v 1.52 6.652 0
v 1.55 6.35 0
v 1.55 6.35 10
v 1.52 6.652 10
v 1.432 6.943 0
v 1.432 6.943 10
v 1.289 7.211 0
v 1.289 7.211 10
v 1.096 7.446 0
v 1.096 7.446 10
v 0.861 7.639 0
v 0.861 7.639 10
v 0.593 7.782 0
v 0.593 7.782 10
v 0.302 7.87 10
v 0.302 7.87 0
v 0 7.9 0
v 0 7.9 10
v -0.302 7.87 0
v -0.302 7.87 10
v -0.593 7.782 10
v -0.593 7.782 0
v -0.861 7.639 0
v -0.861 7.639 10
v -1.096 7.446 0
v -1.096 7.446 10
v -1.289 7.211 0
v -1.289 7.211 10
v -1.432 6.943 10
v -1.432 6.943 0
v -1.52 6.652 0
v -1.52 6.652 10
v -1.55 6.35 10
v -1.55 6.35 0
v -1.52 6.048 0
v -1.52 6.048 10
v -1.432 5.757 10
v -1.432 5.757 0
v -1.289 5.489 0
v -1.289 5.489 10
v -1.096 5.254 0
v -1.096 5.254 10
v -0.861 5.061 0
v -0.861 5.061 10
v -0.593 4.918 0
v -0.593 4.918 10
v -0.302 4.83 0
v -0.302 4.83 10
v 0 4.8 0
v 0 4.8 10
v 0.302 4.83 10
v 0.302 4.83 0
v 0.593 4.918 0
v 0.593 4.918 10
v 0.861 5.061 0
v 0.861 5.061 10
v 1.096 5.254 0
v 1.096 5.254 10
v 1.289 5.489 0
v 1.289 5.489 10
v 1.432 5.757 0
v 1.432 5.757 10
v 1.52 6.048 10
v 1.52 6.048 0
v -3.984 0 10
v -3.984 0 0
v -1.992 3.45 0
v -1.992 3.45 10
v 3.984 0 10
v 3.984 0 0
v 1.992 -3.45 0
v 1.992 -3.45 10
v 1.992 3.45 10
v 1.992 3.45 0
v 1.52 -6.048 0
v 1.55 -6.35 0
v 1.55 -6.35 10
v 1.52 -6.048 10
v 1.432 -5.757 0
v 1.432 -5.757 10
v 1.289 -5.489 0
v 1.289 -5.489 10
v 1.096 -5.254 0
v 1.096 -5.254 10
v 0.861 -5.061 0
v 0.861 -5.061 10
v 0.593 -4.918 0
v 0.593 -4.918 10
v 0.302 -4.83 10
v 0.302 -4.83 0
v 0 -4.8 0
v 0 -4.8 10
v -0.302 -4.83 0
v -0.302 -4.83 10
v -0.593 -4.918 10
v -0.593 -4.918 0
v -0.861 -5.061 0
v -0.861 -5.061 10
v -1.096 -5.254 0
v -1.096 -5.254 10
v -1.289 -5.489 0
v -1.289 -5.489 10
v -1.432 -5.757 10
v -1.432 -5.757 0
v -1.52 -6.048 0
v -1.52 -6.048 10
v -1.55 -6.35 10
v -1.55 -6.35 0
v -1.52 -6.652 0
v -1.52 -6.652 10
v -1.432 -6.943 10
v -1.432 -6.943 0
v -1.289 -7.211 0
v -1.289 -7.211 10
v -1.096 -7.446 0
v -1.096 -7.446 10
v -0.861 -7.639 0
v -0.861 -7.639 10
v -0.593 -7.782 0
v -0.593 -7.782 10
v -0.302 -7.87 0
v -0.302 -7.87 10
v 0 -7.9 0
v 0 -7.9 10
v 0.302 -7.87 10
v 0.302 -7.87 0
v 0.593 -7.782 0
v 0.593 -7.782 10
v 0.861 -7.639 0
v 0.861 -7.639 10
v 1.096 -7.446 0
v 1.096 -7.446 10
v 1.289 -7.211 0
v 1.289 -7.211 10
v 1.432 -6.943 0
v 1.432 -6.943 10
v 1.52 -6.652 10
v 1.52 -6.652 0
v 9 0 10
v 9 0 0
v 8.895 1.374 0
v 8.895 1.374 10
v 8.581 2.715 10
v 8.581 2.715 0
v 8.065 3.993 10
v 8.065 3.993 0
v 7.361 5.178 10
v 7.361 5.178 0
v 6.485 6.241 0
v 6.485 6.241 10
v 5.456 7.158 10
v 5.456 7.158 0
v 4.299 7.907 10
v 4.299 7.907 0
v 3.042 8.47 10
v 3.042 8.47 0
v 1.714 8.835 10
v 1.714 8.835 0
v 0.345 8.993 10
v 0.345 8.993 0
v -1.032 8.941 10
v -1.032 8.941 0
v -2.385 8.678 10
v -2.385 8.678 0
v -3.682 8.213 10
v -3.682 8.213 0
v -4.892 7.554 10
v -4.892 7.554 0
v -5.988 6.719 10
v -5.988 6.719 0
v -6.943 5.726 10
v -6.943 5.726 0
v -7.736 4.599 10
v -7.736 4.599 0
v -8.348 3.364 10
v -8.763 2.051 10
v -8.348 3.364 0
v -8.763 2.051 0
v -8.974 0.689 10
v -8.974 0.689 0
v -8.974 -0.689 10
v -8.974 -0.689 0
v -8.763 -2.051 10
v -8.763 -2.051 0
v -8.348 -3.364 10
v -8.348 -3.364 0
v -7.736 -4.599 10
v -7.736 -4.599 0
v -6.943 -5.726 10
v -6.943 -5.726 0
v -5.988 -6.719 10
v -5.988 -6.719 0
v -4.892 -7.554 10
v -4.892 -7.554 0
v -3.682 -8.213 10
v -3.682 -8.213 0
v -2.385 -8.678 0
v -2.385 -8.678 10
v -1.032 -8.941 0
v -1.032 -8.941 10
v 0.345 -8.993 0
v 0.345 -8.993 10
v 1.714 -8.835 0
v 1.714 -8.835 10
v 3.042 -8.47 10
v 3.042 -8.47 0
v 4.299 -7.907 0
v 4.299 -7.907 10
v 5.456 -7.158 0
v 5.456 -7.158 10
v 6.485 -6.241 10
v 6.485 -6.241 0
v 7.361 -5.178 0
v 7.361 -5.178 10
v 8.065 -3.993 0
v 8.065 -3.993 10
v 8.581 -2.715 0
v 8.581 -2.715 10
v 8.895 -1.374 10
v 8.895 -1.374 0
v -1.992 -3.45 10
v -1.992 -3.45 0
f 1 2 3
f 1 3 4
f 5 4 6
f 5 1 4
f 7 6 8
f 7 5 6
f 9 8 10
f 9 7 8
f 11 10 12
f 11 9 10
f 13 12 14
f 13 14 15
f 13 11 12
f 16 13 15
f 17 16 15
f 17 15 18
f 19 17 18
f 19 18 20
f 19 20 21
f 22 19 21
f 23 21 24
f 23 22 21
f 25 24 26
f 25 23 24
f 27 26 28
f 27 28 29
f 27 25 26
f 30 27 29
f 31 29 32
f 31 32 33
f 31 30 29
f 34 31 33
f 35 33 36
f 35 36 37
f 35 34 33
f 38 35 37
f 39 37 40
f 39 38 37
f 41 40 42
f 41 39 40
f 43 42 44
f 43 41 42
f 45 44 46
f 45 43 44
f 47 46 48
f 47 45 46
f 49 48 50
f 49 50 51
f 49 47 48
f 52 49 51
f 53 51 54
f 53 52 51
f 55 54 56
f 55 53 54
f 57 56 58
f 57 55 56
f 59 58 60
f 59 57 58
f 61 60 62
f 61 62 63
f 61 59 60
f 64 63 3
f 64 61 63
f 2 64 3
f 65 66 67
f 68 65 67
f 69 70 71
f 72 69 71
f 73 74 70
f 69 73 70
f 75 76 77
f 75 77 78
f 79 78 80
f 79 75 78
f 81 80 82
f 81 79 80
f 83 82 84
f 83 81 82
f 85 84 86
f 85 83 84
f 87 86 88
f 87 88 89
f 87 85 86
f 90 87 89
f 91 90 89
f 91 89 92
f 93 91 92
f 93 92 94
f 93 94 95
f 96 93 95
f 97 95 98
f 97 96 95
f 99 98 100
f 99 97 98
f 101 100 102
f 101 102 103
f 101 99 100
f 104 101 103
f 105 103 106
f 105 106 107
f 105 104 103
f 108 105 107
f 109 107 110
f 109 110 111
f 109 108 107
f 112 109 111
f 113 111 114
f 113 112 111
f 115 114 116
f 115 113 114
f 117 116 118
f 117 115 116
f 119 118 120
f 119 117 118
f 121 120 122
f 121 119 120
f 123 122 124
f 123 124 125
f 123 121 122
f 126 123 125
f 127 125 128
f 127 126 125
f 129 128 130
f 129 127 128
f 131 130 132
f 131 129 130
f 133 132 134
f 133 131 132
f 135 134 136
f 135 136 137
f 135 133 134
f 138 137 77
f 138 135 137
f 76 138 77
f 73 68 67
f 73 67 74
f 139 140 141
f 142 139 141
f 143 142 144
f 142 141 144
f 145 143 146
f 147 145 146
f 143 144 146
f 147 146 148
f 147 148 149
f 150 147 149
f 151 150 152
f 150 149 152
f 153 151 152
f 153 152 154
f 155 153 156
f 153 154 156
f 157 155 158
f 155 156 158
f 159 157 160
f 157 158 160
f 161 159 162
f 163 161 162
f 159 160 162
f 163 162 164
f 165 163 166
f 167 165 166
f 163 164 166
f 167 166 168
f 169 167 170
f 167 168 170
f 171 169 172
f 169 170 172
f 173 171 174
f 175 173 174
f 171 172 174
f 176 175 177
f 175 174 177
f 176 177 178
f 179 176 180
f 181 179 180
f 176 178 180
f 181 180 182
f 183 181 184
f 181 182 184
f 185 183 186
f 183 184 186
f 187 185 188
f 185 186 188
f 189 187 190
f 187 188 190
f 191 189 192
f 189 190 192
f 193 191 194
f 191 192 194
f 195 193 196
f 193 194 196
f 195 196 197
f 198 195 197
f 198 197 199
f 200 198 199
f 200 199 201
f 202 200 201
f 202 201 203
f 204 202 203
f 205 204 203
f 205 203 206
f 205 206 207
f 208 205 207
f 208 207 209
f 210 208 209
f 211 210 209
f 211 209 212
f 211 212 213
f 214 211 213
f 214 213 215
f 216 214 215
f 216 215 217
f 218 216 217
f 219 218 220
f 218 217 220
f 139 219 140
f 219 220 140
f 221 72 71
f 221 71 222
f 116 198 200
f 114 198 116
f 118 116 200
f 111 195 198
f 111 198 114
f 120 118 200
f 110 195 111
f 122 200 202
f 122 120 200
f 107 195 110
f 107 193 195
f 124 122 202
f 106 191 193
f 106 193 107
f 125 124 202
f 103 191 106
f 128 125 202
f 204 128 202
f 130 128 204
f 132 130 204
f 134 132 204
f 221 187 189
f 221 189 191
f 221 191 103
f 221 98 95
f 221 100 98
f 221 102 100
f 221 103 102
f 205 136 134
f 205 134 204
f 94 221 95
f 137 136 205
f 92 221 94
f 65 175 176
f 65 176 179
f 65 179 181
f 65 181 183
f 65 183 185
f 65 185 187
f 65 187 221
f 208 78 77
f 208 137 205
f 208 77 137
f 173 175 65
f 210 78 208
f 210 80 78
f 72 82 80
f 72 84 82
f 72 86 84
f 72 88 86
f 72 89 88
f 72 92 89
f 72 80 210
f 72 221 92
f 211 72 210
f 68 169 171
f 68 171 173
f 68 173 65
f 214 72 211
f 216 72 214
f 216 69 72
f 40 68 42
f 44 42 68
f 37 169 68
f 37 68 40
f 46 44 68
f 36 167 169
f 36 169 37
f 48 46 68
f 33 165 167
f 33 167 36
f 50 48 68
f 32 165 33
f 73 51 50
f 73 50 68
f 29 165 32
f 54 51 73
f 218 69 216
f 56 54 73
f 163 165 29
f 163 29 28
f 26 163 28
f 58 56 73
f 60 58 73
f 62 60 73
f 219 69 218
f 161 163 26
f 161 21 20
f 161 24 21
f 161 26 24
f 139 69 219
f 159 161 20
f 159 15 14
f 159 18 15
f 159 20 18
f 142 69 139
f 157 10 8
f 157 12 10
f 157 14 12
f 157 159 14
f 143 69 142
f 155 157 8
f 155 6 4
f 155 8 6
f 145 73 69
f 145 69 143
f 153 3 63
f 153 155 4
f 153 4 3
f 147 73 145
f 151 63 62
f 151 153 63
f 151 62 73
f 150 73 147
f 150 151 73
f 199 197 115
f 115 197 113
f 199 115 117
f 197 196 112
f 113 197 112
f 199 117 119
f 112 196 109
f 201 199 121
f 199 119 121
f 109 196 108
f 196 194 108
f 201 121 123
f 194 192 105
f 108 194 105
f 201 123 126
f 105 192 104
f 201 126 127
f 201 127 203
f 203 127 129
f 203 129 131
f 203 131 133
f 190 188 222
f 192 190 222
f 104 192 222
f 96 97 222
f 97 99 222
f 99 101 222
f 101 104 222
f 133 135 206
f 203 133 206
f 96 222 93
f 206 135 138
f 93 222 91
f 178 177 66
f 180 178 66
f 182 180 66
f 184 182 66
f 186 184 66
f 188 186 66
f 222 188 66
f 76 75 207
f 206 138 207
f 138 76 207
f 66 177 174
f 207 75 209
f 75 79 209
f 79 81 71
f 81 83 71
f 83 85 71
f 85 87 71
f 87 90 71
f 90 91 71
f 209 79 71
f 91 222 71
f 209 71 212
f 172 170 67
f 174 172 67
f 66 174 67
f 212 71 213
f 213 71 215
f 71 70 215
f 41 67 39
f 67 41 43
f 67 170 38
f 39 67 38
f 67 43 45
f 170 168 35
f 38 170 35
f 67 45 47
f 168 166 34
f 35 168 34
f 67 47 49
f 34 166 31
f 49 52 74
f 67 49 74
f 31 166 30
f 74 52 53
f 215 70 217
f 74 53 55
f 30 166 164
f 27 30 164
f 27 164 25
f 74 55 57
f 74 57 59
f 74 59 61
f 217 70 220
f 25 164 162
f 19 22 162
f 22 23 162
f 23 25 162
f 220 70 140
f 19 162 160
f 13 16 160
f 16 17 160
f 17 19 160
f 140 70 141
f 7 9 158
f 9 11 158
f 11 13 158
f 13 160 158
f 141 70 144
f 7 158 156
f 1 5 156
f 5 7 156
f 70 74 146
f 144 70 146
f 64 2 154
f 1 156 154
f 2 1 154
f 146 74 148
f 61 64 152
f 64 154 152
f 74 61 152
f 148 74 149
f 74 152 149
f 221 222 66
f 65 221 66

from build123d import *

# Parameters (mm, degrees)
F0_R     = 9
F0_R_2   = 1.55
F1_DEPTH = 10


with BuildPart() as f1:
    # F0 (on Top) → F1 (new body)
    with BuildSketch(Plane.XY):
        Circle(F0_R)
        with Locations((0, -6.35)):
            Circle(F0_R_2, mode=Mode.SUBTRACT)
        with Locations((-6.35, 0)):
            Circle(F0_R_2, mode=Mode.SUBTRACT)
        Polygon((-3.983717, 0), (-1.991858, 3.45), (1.991858, 3.45), (3.983717, 0), (1.991858, -3.45), (-1.991858, -3.45), align=None, mode=Mode.SUBTRACT)
        with Locations((6.35, 0)):
            Circle(F0_R_2, mode=Mode.SUBTRACT)
        with Locations((0, 6.35)):
            Circle(F0_R_2, mode=Mode.SUBTRACT)
        with Locations((-6.35, 0)):
            Circle(F0_R_2)
        with Locations((6.35, 0)):
            Circle(F0_R_2)
    extrude(amount=F1_DEPTH)


solid = f1.part
